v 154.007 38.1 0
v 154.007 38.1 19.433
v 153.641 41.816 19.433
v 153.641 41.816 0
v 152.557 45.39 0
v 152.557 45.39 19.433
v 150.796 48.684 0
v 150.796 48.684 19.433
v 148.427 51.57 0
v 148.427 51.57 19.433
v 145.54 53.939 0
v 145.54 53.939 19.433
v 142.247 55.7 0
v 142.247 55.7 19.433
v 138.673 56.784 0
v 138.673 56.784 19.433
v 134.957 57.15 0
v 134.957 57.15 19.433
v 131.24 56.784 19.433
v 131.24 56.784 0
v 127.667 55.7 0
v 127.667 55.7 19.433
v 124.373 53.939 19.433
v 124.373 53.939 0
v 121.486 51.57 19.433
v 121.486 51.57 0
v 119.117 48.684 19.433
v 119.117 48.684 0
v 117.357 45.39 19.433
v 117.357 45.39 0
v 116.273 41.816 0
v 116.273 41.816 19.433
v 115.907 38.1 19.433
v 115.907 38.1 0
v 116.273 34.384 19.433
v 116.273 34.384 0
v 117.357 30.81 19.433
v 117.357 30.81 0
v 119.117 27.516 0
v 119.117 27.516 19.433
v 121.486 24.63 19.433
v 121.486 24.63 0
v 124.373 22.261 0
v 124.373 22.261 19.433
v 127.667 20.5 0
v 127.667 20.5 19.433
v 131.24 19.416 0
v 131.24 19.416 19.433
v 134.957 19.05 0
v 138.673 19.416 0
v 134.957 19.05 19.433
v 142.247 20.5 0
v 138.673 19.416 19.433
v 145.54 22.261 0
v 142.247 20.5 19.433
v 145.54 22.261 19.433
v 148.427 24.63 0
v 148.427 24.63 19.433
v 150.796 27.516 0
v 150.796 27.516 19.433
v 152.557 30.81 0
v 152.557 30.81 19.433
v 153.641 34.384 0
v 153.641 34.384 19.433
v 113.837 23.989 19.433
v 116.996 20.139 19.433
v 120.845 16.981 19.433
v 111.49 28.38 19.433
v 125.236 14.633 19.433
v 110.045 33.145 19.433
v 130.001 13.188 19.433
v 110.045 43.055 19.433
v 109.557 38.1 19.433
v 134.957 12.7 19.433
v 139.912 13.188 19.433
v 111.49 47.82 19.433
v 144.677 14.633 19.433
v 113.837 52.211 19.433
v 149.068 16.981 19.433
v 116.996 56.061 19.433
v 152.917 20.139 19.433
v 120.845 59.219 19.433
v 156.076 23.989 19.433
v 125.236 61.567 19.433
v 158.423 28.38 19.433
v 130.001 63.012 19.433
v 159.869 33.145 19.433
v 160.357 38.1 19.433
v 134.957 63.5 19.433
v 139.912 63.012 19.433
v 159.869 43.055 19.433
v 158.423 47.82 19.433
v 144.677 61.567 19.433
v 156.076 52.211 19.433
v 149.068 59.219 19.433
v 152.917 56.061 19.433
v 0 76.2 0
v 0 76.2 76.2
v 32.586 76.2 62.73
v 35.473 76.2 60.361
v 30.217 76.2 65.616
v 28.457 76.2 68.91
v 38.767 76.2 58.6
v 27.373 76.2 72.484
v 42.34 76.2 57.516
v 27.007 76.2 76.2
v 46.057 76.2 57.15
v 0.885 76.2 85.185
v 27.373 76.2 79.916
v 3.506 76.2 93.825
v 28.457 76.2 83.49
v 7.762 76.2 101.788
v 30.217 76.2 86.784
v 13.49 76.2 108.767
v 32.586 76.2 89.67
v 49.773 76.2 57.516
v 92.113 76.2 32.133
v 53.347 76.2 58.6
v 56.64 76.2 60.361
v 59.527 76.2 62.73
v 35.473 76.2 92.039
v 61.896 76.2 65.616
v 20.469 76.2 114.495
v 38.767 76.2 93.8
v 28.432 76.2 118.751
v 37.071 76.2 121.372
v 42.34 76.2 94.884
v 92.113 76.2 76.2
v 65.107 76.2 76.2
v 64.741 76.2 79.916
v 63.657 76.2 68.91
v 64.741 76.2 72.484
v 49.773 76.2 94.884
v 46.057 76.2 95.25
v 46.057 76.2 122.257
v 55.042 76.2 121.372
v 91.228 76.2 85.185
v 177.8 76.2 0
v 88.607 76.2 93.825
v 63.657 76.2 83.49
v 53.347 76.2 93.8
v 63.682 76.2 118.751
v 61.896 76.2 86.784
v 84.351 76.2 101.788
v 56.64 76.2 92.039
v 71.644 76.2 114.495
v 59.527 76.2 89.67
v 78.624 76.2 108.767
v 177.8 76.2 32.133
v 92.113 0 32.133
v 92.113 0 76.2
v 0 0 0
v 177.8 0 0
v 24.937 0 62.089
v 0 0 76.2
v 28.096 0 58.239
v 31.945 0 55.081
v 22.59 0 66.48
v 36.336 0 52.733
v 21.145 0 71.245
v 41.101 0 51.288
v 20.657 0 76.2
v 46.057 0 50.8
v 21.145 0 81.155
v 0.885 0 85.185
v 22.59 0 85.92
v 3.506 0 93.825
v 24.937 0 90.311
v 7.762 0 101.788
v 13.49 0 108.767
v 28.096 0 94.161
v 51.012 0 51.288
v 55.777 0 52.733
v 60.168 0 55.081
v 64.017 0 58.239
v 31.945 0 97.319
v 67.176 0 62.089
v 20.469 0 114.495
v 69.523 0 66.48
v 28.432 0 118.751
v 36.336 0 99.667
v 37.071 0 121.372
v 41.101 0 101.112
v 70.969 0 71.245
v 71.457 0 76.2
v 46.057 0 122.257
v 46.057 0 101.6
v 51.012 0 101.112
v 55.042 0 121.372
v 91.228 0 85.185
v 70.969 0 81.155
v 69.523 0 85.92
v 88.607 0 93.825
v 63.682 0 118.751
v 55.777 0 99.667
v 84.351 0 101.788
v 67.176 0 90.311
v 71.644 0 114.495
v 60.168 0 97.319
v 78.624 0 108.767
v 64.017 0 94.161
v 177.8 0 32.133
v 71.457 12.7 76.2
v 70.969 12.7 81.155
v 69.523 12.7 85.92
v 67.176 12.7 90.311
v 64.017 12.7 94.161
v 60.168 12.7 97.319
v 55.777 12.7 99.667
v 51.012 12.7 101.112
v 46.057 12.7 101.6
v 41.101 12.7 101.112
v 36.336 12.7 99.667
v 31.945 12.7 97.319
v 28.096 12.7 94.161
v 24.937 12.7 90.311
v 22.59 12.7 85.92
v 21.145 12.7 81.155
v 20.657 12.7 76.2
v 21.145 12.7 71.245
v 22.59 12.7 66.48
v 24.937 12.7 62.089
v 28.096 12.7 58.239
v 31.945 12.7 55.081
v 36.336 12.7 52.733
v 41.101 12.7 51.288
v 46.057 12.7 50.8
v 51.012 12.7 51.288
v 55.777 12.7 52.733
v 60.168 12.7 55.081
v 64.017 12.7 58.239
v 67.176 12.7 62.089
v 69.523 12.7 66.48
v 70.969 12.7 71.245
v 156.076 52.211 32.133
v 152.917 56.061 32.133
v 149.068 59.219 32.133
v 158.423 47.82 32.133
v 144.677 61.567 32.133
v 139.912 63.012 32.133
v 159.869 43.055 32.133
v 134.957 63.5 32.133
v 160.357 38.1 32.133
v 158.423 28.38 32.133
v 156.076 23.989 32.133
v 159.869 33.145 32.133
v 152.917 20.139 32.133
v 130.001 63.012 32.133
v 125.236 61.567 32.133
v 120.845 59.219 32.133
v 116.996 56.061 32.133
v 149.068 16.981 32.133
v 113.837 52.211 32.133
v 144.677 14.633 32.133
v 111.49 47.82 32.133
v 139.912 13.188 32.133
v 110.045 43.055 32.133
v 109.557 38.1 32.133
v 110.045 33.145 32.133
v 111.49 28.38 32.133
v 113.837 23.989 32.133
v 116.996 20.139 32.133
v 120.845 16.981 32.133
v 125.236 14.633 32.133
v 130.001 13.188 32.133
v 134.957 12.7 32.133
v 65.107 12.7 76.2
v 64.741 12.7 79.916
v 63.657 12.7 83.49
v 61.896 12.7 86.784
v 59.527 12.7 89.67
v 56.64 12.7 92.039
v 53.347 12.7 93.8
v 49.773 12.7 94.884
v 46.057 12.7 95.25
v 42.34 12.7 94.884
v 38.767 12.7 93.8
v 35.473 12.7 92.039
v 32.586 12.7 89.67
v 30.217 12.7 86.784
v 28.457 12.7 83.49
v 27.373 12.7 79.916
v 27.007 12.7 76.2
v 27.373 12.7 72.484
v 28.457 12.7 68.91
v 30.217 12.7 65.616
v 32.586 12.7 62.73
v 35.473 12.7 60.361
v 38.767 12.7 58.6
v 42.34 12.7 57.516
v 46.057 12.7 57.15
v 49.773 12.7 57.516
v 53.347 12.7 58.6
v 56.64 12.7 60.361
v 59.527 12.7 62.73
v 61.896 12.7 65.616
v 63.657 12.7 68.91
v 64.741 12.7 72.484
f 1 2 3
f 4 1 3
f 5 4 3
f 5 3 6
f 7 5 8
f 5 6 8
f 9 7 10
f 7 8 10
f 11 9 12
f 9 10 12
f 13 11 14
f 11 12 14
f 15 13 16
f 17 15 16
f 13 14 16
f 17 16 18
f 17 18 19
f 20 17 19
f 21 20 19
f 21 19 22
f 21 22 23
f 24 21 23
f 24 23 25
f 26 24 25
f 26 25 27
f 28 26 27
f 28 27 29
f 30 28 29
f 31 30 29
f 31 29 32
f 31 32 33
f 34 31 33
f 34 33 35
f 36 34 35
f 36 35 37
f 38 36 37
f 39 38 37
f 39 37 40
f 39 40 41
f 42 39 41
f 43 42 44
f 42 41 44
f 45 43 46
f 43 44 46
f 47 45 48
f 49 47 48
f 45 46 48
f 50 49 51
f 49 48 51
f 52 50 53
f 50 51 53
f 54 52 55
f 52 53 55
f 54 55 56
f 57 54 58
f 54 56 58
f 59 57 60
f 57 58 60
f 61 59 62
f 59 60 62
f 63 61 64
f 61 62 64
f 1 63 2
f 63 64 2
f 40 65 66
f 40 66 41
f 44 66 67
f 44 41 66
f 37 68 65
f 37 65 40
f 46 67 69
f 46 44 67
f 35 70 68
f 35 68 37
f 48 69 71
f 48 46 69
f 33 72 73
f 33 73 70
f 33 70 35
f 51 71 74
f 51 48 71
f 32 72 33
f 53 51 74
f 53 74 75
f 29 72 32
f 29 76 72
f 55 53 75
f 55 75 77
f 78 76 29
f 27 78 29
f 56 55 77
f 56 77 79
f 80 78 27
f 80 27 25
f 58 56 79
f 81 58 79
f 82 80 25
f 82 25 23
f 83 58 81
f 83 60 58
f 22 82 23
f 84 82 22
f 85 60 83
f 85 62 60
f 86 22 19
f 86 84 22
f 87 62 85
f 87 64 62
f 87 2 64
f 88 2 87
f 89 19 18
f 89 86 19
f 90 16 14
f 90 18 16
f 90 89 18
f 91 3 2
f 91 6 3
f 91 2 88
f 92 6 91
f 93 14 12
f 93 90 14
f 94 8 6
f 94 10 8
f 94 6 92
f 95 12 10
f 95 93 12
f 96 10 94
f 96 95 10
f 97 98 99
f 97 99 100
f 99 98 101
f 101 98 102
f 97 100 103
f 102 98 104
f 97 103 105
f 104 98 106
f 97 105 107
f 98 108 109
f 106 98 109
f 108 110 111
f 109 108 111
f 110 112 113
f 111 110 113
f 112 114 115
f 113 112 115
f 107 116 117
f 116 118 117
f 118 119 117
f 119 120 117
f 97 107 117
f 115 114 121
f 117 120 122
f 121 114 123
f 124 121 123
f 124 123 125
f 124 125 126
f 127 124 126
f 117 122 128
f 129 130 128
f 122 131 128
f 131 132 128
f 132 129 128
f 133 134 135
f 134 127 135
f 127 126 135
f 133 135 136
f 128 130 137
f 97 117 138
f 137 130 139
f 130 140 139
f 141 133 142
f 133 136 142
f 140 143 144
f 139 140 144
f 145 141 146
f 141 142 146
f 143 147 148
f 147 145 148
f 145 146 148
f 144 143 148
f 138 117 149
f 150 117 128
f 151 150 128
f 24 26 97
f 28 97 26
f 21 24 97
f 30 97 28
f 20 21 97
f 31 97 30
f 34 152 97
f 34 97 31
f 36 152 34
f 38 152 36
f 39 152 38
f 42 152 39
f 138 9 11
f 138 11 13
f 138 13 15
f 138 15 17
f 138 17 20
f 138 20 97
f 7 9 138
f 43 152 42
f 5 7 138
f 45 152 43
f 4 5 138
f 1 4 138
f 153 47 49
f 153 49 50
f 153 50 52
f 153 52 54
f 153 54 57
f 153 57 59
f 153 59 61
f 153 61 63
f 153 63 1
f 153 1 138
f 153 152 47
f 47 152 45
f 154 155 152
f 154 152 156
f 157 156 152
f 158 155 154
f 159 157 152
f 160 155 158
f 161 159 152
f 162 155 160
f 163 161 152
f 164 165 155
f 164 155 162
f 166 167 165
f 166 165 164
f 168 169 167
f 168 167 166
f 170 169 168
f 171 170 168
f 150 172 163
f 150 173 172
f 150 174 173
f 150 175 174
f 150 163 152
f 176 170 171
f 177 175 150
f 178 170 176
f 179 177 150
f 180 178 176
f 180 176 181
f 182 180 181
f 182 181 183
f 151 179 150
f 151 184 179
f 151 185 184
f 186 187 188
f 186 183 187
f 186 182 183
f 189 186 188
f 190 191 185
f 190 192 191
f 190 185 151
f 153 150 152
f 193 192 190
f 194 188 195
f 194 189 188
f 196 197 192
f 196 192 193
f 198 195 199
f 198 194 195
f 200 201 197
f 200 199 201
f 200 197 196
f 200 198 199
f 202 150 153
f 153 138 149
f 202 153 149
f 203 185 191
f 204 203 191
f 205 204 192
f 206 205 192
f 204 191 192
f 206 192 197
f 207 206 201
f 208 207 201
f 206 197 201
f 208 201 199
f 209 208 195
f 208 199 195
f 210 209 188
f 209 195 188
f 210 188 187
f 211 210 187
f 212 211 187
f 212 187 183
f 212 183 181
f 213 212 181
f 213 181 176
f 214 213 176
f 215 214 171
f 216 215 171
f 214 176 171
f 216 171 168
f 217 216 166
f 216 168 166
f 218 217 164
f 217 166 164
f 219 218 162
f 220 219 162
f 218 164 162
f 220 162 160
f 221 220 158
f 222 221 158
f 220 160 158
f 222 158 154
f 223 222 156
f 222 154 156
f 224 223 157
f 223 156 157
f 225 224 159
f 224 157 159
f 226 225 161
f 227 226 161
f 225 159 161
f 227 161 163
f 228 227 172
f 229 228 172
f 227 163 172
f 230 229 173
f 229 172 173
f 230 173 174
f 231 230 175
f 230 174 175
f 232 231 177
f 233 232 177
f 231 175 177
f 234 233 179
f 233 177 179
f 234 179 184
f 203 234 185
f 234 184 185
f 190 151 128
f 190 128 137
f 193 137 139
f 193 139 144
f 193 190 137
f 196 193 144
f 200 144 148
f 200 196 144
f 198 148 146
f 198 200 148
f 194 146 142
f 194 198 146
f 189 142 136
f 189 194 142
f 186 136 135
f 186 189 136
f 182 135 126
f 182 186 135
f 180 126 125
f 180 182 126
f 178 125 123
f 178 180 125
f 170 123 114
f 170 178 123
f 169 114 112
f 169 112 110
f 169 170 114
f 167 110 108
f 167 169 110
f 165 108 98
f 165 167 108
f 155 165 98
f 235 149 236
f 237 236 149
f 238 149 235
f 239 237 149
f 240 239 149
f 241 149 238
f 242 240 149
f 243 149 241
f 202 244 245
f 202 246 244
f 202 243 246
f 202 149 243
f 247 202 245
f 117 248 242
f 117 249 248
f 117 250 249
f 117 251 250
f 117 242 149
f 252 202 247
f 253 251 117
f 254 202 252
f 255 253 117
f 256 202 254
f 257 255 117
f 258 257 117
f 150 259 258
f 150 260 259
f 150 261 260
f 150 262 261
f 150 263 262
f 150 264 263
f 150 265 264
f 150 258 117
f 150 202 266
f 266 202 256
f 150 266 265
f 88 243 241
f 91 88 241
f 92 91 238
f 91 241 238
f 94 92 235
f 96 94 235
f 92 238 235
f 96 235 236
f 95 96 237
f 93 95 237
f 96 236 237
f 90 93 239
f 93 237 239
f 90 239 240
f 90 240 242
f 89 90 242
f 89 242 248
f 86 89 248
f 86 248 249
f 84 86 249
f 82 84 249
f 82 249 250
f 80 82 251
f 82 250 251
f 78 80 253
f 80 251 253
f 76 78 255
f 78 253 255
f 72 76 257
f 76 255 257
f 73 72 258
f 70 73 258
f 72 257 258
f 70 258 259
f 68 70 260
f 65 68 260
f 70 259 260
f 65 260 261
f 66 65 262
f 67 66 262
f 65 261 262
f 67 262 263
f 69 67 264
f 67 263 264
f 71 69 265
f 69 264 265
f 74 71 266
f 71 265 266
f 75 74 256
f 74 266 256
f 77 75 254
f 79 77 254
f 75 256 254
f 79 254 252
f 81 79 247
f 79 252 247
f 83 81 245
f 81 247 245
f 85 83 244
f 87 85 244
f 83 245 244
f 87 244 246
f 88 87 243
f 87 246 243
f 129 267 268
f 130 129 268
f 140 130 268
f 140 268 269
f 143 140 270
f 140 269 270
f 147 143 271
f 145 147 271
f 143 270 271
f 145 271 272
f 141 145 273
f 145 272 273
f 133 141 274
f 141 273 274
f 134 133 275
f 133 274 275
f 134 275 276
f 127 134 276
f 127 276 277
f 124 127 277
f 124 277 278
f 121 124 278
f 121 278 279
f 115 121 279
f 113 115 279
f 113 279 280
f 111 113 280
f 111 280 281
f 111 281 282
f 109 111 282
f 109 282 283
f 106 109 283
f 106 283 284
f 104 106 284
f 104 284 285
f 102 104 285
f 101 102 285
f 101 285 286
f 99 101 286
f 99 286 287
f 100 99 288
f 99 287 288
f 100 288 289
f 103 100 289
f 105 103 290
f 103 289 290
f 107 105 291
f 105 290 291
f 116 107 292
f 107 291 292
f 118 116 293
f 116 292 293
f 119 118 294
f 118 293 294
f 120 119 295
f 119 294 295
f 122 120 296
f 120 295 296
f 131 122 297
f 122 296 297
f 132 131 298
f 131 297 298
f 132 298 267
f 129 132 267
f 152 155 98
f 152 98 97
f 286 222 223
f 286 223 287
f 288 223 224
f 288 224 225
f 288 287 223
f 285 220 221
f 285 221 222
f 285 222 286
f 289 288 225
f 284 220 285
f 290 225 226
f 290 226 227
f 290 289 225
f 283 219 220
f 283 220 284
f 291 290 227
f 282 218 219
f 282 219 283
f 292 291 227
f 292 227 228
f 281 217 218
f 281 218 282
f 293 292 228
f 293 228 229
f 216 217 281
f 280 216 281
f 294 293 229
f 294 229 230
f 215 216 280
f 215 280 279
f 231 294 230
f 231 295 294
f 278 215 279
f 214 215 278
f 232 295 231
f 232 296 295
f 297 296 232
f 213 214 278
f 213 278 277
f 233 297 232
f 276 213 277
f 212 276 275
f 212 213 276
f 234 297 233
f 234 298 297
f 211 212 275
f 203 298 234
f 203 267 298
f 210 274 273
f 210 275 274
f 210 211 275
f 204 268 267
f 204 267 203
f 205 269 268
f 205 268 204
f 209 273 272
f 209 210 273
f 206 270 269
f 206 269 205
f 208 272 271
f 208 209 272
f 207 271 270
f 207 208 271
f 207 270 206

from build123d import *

# Parameters (mm, degrees)
F0_R     = 25.4
F0_R_2   = 19.05
F1_DEPTH = 76.2
F2_DEPTH = 12.7
F3_R     = 19.05
F4_DEPTH = 32.133529
F3_R_2   = 25.4
F5_DEPTH = 12.7


with BuildPart() as f1:
    # F0 (on Front) → F1 (new body)
    with BuildSketch(Plane.XZ):
        with BuildLine():
            Line((0, 76.2), (0, 0))
            Line((0, 0), (177.8, 0))
            Line((177.8, 0), (177.8, 32.132529))
            Line((177.8, 32.132529), (92.11325, 32.132529))
            Line((92.11325, 32.132529), (92.11325, 76.2))
            ThreePointArc((92.11325, 76.2), (46.056625, 122.256625), (0, 76.2))
        make_face()
        with Locations((46.056625, 76.2)):
            Circle(F0_R, mode=Mode.SUBTRACT)
        with Locations((46.056625, 76.2)):
            Circle(F0_R)
        with Locations((46.056625, 76.2)):
            Circle(F0_R_2, mode=Mode.SUBTRACT)
    extrude(amount=-F1_DEPTH)

    # F0 (on Front) → F2 (cut)
    with BuildSketch(Plane.XZ):
        with Locations((46.056625, 76.2)):
            Circle(F0_R)
        with Locations((46.056625, 76.2)):
            Circle(F0_R_2, mode=Mode.SUBTRACT)
    extrude(amount=-F2_DEPTH, mode=Mode.SUBTRACT)

    # F3 (on face) → F4 (cut, through all)
    with BuildSketch(Plane.XY.offset(32.132529)):
        with Locations((134.956625, 38.1)):
            Circle(F3_R)
    extrude(amount=-F4_DEPTH, mode=Mode.SUBTRACT)

    # F3 (on face) → F5 (cut)
    with BuildSketch(Plane.XY.offset(32.132529)):
        with Locations((134.956625, 38.1)):
            Circle(F3_R_2)
        with Locations((134.956625, 38.1)):
            Circle(F3_R, mode=Mode.SUBTRACT)
    extrude(amount=-F5_DEPTH, mode=Mode.SUBTRACT)


solid = f1.part
